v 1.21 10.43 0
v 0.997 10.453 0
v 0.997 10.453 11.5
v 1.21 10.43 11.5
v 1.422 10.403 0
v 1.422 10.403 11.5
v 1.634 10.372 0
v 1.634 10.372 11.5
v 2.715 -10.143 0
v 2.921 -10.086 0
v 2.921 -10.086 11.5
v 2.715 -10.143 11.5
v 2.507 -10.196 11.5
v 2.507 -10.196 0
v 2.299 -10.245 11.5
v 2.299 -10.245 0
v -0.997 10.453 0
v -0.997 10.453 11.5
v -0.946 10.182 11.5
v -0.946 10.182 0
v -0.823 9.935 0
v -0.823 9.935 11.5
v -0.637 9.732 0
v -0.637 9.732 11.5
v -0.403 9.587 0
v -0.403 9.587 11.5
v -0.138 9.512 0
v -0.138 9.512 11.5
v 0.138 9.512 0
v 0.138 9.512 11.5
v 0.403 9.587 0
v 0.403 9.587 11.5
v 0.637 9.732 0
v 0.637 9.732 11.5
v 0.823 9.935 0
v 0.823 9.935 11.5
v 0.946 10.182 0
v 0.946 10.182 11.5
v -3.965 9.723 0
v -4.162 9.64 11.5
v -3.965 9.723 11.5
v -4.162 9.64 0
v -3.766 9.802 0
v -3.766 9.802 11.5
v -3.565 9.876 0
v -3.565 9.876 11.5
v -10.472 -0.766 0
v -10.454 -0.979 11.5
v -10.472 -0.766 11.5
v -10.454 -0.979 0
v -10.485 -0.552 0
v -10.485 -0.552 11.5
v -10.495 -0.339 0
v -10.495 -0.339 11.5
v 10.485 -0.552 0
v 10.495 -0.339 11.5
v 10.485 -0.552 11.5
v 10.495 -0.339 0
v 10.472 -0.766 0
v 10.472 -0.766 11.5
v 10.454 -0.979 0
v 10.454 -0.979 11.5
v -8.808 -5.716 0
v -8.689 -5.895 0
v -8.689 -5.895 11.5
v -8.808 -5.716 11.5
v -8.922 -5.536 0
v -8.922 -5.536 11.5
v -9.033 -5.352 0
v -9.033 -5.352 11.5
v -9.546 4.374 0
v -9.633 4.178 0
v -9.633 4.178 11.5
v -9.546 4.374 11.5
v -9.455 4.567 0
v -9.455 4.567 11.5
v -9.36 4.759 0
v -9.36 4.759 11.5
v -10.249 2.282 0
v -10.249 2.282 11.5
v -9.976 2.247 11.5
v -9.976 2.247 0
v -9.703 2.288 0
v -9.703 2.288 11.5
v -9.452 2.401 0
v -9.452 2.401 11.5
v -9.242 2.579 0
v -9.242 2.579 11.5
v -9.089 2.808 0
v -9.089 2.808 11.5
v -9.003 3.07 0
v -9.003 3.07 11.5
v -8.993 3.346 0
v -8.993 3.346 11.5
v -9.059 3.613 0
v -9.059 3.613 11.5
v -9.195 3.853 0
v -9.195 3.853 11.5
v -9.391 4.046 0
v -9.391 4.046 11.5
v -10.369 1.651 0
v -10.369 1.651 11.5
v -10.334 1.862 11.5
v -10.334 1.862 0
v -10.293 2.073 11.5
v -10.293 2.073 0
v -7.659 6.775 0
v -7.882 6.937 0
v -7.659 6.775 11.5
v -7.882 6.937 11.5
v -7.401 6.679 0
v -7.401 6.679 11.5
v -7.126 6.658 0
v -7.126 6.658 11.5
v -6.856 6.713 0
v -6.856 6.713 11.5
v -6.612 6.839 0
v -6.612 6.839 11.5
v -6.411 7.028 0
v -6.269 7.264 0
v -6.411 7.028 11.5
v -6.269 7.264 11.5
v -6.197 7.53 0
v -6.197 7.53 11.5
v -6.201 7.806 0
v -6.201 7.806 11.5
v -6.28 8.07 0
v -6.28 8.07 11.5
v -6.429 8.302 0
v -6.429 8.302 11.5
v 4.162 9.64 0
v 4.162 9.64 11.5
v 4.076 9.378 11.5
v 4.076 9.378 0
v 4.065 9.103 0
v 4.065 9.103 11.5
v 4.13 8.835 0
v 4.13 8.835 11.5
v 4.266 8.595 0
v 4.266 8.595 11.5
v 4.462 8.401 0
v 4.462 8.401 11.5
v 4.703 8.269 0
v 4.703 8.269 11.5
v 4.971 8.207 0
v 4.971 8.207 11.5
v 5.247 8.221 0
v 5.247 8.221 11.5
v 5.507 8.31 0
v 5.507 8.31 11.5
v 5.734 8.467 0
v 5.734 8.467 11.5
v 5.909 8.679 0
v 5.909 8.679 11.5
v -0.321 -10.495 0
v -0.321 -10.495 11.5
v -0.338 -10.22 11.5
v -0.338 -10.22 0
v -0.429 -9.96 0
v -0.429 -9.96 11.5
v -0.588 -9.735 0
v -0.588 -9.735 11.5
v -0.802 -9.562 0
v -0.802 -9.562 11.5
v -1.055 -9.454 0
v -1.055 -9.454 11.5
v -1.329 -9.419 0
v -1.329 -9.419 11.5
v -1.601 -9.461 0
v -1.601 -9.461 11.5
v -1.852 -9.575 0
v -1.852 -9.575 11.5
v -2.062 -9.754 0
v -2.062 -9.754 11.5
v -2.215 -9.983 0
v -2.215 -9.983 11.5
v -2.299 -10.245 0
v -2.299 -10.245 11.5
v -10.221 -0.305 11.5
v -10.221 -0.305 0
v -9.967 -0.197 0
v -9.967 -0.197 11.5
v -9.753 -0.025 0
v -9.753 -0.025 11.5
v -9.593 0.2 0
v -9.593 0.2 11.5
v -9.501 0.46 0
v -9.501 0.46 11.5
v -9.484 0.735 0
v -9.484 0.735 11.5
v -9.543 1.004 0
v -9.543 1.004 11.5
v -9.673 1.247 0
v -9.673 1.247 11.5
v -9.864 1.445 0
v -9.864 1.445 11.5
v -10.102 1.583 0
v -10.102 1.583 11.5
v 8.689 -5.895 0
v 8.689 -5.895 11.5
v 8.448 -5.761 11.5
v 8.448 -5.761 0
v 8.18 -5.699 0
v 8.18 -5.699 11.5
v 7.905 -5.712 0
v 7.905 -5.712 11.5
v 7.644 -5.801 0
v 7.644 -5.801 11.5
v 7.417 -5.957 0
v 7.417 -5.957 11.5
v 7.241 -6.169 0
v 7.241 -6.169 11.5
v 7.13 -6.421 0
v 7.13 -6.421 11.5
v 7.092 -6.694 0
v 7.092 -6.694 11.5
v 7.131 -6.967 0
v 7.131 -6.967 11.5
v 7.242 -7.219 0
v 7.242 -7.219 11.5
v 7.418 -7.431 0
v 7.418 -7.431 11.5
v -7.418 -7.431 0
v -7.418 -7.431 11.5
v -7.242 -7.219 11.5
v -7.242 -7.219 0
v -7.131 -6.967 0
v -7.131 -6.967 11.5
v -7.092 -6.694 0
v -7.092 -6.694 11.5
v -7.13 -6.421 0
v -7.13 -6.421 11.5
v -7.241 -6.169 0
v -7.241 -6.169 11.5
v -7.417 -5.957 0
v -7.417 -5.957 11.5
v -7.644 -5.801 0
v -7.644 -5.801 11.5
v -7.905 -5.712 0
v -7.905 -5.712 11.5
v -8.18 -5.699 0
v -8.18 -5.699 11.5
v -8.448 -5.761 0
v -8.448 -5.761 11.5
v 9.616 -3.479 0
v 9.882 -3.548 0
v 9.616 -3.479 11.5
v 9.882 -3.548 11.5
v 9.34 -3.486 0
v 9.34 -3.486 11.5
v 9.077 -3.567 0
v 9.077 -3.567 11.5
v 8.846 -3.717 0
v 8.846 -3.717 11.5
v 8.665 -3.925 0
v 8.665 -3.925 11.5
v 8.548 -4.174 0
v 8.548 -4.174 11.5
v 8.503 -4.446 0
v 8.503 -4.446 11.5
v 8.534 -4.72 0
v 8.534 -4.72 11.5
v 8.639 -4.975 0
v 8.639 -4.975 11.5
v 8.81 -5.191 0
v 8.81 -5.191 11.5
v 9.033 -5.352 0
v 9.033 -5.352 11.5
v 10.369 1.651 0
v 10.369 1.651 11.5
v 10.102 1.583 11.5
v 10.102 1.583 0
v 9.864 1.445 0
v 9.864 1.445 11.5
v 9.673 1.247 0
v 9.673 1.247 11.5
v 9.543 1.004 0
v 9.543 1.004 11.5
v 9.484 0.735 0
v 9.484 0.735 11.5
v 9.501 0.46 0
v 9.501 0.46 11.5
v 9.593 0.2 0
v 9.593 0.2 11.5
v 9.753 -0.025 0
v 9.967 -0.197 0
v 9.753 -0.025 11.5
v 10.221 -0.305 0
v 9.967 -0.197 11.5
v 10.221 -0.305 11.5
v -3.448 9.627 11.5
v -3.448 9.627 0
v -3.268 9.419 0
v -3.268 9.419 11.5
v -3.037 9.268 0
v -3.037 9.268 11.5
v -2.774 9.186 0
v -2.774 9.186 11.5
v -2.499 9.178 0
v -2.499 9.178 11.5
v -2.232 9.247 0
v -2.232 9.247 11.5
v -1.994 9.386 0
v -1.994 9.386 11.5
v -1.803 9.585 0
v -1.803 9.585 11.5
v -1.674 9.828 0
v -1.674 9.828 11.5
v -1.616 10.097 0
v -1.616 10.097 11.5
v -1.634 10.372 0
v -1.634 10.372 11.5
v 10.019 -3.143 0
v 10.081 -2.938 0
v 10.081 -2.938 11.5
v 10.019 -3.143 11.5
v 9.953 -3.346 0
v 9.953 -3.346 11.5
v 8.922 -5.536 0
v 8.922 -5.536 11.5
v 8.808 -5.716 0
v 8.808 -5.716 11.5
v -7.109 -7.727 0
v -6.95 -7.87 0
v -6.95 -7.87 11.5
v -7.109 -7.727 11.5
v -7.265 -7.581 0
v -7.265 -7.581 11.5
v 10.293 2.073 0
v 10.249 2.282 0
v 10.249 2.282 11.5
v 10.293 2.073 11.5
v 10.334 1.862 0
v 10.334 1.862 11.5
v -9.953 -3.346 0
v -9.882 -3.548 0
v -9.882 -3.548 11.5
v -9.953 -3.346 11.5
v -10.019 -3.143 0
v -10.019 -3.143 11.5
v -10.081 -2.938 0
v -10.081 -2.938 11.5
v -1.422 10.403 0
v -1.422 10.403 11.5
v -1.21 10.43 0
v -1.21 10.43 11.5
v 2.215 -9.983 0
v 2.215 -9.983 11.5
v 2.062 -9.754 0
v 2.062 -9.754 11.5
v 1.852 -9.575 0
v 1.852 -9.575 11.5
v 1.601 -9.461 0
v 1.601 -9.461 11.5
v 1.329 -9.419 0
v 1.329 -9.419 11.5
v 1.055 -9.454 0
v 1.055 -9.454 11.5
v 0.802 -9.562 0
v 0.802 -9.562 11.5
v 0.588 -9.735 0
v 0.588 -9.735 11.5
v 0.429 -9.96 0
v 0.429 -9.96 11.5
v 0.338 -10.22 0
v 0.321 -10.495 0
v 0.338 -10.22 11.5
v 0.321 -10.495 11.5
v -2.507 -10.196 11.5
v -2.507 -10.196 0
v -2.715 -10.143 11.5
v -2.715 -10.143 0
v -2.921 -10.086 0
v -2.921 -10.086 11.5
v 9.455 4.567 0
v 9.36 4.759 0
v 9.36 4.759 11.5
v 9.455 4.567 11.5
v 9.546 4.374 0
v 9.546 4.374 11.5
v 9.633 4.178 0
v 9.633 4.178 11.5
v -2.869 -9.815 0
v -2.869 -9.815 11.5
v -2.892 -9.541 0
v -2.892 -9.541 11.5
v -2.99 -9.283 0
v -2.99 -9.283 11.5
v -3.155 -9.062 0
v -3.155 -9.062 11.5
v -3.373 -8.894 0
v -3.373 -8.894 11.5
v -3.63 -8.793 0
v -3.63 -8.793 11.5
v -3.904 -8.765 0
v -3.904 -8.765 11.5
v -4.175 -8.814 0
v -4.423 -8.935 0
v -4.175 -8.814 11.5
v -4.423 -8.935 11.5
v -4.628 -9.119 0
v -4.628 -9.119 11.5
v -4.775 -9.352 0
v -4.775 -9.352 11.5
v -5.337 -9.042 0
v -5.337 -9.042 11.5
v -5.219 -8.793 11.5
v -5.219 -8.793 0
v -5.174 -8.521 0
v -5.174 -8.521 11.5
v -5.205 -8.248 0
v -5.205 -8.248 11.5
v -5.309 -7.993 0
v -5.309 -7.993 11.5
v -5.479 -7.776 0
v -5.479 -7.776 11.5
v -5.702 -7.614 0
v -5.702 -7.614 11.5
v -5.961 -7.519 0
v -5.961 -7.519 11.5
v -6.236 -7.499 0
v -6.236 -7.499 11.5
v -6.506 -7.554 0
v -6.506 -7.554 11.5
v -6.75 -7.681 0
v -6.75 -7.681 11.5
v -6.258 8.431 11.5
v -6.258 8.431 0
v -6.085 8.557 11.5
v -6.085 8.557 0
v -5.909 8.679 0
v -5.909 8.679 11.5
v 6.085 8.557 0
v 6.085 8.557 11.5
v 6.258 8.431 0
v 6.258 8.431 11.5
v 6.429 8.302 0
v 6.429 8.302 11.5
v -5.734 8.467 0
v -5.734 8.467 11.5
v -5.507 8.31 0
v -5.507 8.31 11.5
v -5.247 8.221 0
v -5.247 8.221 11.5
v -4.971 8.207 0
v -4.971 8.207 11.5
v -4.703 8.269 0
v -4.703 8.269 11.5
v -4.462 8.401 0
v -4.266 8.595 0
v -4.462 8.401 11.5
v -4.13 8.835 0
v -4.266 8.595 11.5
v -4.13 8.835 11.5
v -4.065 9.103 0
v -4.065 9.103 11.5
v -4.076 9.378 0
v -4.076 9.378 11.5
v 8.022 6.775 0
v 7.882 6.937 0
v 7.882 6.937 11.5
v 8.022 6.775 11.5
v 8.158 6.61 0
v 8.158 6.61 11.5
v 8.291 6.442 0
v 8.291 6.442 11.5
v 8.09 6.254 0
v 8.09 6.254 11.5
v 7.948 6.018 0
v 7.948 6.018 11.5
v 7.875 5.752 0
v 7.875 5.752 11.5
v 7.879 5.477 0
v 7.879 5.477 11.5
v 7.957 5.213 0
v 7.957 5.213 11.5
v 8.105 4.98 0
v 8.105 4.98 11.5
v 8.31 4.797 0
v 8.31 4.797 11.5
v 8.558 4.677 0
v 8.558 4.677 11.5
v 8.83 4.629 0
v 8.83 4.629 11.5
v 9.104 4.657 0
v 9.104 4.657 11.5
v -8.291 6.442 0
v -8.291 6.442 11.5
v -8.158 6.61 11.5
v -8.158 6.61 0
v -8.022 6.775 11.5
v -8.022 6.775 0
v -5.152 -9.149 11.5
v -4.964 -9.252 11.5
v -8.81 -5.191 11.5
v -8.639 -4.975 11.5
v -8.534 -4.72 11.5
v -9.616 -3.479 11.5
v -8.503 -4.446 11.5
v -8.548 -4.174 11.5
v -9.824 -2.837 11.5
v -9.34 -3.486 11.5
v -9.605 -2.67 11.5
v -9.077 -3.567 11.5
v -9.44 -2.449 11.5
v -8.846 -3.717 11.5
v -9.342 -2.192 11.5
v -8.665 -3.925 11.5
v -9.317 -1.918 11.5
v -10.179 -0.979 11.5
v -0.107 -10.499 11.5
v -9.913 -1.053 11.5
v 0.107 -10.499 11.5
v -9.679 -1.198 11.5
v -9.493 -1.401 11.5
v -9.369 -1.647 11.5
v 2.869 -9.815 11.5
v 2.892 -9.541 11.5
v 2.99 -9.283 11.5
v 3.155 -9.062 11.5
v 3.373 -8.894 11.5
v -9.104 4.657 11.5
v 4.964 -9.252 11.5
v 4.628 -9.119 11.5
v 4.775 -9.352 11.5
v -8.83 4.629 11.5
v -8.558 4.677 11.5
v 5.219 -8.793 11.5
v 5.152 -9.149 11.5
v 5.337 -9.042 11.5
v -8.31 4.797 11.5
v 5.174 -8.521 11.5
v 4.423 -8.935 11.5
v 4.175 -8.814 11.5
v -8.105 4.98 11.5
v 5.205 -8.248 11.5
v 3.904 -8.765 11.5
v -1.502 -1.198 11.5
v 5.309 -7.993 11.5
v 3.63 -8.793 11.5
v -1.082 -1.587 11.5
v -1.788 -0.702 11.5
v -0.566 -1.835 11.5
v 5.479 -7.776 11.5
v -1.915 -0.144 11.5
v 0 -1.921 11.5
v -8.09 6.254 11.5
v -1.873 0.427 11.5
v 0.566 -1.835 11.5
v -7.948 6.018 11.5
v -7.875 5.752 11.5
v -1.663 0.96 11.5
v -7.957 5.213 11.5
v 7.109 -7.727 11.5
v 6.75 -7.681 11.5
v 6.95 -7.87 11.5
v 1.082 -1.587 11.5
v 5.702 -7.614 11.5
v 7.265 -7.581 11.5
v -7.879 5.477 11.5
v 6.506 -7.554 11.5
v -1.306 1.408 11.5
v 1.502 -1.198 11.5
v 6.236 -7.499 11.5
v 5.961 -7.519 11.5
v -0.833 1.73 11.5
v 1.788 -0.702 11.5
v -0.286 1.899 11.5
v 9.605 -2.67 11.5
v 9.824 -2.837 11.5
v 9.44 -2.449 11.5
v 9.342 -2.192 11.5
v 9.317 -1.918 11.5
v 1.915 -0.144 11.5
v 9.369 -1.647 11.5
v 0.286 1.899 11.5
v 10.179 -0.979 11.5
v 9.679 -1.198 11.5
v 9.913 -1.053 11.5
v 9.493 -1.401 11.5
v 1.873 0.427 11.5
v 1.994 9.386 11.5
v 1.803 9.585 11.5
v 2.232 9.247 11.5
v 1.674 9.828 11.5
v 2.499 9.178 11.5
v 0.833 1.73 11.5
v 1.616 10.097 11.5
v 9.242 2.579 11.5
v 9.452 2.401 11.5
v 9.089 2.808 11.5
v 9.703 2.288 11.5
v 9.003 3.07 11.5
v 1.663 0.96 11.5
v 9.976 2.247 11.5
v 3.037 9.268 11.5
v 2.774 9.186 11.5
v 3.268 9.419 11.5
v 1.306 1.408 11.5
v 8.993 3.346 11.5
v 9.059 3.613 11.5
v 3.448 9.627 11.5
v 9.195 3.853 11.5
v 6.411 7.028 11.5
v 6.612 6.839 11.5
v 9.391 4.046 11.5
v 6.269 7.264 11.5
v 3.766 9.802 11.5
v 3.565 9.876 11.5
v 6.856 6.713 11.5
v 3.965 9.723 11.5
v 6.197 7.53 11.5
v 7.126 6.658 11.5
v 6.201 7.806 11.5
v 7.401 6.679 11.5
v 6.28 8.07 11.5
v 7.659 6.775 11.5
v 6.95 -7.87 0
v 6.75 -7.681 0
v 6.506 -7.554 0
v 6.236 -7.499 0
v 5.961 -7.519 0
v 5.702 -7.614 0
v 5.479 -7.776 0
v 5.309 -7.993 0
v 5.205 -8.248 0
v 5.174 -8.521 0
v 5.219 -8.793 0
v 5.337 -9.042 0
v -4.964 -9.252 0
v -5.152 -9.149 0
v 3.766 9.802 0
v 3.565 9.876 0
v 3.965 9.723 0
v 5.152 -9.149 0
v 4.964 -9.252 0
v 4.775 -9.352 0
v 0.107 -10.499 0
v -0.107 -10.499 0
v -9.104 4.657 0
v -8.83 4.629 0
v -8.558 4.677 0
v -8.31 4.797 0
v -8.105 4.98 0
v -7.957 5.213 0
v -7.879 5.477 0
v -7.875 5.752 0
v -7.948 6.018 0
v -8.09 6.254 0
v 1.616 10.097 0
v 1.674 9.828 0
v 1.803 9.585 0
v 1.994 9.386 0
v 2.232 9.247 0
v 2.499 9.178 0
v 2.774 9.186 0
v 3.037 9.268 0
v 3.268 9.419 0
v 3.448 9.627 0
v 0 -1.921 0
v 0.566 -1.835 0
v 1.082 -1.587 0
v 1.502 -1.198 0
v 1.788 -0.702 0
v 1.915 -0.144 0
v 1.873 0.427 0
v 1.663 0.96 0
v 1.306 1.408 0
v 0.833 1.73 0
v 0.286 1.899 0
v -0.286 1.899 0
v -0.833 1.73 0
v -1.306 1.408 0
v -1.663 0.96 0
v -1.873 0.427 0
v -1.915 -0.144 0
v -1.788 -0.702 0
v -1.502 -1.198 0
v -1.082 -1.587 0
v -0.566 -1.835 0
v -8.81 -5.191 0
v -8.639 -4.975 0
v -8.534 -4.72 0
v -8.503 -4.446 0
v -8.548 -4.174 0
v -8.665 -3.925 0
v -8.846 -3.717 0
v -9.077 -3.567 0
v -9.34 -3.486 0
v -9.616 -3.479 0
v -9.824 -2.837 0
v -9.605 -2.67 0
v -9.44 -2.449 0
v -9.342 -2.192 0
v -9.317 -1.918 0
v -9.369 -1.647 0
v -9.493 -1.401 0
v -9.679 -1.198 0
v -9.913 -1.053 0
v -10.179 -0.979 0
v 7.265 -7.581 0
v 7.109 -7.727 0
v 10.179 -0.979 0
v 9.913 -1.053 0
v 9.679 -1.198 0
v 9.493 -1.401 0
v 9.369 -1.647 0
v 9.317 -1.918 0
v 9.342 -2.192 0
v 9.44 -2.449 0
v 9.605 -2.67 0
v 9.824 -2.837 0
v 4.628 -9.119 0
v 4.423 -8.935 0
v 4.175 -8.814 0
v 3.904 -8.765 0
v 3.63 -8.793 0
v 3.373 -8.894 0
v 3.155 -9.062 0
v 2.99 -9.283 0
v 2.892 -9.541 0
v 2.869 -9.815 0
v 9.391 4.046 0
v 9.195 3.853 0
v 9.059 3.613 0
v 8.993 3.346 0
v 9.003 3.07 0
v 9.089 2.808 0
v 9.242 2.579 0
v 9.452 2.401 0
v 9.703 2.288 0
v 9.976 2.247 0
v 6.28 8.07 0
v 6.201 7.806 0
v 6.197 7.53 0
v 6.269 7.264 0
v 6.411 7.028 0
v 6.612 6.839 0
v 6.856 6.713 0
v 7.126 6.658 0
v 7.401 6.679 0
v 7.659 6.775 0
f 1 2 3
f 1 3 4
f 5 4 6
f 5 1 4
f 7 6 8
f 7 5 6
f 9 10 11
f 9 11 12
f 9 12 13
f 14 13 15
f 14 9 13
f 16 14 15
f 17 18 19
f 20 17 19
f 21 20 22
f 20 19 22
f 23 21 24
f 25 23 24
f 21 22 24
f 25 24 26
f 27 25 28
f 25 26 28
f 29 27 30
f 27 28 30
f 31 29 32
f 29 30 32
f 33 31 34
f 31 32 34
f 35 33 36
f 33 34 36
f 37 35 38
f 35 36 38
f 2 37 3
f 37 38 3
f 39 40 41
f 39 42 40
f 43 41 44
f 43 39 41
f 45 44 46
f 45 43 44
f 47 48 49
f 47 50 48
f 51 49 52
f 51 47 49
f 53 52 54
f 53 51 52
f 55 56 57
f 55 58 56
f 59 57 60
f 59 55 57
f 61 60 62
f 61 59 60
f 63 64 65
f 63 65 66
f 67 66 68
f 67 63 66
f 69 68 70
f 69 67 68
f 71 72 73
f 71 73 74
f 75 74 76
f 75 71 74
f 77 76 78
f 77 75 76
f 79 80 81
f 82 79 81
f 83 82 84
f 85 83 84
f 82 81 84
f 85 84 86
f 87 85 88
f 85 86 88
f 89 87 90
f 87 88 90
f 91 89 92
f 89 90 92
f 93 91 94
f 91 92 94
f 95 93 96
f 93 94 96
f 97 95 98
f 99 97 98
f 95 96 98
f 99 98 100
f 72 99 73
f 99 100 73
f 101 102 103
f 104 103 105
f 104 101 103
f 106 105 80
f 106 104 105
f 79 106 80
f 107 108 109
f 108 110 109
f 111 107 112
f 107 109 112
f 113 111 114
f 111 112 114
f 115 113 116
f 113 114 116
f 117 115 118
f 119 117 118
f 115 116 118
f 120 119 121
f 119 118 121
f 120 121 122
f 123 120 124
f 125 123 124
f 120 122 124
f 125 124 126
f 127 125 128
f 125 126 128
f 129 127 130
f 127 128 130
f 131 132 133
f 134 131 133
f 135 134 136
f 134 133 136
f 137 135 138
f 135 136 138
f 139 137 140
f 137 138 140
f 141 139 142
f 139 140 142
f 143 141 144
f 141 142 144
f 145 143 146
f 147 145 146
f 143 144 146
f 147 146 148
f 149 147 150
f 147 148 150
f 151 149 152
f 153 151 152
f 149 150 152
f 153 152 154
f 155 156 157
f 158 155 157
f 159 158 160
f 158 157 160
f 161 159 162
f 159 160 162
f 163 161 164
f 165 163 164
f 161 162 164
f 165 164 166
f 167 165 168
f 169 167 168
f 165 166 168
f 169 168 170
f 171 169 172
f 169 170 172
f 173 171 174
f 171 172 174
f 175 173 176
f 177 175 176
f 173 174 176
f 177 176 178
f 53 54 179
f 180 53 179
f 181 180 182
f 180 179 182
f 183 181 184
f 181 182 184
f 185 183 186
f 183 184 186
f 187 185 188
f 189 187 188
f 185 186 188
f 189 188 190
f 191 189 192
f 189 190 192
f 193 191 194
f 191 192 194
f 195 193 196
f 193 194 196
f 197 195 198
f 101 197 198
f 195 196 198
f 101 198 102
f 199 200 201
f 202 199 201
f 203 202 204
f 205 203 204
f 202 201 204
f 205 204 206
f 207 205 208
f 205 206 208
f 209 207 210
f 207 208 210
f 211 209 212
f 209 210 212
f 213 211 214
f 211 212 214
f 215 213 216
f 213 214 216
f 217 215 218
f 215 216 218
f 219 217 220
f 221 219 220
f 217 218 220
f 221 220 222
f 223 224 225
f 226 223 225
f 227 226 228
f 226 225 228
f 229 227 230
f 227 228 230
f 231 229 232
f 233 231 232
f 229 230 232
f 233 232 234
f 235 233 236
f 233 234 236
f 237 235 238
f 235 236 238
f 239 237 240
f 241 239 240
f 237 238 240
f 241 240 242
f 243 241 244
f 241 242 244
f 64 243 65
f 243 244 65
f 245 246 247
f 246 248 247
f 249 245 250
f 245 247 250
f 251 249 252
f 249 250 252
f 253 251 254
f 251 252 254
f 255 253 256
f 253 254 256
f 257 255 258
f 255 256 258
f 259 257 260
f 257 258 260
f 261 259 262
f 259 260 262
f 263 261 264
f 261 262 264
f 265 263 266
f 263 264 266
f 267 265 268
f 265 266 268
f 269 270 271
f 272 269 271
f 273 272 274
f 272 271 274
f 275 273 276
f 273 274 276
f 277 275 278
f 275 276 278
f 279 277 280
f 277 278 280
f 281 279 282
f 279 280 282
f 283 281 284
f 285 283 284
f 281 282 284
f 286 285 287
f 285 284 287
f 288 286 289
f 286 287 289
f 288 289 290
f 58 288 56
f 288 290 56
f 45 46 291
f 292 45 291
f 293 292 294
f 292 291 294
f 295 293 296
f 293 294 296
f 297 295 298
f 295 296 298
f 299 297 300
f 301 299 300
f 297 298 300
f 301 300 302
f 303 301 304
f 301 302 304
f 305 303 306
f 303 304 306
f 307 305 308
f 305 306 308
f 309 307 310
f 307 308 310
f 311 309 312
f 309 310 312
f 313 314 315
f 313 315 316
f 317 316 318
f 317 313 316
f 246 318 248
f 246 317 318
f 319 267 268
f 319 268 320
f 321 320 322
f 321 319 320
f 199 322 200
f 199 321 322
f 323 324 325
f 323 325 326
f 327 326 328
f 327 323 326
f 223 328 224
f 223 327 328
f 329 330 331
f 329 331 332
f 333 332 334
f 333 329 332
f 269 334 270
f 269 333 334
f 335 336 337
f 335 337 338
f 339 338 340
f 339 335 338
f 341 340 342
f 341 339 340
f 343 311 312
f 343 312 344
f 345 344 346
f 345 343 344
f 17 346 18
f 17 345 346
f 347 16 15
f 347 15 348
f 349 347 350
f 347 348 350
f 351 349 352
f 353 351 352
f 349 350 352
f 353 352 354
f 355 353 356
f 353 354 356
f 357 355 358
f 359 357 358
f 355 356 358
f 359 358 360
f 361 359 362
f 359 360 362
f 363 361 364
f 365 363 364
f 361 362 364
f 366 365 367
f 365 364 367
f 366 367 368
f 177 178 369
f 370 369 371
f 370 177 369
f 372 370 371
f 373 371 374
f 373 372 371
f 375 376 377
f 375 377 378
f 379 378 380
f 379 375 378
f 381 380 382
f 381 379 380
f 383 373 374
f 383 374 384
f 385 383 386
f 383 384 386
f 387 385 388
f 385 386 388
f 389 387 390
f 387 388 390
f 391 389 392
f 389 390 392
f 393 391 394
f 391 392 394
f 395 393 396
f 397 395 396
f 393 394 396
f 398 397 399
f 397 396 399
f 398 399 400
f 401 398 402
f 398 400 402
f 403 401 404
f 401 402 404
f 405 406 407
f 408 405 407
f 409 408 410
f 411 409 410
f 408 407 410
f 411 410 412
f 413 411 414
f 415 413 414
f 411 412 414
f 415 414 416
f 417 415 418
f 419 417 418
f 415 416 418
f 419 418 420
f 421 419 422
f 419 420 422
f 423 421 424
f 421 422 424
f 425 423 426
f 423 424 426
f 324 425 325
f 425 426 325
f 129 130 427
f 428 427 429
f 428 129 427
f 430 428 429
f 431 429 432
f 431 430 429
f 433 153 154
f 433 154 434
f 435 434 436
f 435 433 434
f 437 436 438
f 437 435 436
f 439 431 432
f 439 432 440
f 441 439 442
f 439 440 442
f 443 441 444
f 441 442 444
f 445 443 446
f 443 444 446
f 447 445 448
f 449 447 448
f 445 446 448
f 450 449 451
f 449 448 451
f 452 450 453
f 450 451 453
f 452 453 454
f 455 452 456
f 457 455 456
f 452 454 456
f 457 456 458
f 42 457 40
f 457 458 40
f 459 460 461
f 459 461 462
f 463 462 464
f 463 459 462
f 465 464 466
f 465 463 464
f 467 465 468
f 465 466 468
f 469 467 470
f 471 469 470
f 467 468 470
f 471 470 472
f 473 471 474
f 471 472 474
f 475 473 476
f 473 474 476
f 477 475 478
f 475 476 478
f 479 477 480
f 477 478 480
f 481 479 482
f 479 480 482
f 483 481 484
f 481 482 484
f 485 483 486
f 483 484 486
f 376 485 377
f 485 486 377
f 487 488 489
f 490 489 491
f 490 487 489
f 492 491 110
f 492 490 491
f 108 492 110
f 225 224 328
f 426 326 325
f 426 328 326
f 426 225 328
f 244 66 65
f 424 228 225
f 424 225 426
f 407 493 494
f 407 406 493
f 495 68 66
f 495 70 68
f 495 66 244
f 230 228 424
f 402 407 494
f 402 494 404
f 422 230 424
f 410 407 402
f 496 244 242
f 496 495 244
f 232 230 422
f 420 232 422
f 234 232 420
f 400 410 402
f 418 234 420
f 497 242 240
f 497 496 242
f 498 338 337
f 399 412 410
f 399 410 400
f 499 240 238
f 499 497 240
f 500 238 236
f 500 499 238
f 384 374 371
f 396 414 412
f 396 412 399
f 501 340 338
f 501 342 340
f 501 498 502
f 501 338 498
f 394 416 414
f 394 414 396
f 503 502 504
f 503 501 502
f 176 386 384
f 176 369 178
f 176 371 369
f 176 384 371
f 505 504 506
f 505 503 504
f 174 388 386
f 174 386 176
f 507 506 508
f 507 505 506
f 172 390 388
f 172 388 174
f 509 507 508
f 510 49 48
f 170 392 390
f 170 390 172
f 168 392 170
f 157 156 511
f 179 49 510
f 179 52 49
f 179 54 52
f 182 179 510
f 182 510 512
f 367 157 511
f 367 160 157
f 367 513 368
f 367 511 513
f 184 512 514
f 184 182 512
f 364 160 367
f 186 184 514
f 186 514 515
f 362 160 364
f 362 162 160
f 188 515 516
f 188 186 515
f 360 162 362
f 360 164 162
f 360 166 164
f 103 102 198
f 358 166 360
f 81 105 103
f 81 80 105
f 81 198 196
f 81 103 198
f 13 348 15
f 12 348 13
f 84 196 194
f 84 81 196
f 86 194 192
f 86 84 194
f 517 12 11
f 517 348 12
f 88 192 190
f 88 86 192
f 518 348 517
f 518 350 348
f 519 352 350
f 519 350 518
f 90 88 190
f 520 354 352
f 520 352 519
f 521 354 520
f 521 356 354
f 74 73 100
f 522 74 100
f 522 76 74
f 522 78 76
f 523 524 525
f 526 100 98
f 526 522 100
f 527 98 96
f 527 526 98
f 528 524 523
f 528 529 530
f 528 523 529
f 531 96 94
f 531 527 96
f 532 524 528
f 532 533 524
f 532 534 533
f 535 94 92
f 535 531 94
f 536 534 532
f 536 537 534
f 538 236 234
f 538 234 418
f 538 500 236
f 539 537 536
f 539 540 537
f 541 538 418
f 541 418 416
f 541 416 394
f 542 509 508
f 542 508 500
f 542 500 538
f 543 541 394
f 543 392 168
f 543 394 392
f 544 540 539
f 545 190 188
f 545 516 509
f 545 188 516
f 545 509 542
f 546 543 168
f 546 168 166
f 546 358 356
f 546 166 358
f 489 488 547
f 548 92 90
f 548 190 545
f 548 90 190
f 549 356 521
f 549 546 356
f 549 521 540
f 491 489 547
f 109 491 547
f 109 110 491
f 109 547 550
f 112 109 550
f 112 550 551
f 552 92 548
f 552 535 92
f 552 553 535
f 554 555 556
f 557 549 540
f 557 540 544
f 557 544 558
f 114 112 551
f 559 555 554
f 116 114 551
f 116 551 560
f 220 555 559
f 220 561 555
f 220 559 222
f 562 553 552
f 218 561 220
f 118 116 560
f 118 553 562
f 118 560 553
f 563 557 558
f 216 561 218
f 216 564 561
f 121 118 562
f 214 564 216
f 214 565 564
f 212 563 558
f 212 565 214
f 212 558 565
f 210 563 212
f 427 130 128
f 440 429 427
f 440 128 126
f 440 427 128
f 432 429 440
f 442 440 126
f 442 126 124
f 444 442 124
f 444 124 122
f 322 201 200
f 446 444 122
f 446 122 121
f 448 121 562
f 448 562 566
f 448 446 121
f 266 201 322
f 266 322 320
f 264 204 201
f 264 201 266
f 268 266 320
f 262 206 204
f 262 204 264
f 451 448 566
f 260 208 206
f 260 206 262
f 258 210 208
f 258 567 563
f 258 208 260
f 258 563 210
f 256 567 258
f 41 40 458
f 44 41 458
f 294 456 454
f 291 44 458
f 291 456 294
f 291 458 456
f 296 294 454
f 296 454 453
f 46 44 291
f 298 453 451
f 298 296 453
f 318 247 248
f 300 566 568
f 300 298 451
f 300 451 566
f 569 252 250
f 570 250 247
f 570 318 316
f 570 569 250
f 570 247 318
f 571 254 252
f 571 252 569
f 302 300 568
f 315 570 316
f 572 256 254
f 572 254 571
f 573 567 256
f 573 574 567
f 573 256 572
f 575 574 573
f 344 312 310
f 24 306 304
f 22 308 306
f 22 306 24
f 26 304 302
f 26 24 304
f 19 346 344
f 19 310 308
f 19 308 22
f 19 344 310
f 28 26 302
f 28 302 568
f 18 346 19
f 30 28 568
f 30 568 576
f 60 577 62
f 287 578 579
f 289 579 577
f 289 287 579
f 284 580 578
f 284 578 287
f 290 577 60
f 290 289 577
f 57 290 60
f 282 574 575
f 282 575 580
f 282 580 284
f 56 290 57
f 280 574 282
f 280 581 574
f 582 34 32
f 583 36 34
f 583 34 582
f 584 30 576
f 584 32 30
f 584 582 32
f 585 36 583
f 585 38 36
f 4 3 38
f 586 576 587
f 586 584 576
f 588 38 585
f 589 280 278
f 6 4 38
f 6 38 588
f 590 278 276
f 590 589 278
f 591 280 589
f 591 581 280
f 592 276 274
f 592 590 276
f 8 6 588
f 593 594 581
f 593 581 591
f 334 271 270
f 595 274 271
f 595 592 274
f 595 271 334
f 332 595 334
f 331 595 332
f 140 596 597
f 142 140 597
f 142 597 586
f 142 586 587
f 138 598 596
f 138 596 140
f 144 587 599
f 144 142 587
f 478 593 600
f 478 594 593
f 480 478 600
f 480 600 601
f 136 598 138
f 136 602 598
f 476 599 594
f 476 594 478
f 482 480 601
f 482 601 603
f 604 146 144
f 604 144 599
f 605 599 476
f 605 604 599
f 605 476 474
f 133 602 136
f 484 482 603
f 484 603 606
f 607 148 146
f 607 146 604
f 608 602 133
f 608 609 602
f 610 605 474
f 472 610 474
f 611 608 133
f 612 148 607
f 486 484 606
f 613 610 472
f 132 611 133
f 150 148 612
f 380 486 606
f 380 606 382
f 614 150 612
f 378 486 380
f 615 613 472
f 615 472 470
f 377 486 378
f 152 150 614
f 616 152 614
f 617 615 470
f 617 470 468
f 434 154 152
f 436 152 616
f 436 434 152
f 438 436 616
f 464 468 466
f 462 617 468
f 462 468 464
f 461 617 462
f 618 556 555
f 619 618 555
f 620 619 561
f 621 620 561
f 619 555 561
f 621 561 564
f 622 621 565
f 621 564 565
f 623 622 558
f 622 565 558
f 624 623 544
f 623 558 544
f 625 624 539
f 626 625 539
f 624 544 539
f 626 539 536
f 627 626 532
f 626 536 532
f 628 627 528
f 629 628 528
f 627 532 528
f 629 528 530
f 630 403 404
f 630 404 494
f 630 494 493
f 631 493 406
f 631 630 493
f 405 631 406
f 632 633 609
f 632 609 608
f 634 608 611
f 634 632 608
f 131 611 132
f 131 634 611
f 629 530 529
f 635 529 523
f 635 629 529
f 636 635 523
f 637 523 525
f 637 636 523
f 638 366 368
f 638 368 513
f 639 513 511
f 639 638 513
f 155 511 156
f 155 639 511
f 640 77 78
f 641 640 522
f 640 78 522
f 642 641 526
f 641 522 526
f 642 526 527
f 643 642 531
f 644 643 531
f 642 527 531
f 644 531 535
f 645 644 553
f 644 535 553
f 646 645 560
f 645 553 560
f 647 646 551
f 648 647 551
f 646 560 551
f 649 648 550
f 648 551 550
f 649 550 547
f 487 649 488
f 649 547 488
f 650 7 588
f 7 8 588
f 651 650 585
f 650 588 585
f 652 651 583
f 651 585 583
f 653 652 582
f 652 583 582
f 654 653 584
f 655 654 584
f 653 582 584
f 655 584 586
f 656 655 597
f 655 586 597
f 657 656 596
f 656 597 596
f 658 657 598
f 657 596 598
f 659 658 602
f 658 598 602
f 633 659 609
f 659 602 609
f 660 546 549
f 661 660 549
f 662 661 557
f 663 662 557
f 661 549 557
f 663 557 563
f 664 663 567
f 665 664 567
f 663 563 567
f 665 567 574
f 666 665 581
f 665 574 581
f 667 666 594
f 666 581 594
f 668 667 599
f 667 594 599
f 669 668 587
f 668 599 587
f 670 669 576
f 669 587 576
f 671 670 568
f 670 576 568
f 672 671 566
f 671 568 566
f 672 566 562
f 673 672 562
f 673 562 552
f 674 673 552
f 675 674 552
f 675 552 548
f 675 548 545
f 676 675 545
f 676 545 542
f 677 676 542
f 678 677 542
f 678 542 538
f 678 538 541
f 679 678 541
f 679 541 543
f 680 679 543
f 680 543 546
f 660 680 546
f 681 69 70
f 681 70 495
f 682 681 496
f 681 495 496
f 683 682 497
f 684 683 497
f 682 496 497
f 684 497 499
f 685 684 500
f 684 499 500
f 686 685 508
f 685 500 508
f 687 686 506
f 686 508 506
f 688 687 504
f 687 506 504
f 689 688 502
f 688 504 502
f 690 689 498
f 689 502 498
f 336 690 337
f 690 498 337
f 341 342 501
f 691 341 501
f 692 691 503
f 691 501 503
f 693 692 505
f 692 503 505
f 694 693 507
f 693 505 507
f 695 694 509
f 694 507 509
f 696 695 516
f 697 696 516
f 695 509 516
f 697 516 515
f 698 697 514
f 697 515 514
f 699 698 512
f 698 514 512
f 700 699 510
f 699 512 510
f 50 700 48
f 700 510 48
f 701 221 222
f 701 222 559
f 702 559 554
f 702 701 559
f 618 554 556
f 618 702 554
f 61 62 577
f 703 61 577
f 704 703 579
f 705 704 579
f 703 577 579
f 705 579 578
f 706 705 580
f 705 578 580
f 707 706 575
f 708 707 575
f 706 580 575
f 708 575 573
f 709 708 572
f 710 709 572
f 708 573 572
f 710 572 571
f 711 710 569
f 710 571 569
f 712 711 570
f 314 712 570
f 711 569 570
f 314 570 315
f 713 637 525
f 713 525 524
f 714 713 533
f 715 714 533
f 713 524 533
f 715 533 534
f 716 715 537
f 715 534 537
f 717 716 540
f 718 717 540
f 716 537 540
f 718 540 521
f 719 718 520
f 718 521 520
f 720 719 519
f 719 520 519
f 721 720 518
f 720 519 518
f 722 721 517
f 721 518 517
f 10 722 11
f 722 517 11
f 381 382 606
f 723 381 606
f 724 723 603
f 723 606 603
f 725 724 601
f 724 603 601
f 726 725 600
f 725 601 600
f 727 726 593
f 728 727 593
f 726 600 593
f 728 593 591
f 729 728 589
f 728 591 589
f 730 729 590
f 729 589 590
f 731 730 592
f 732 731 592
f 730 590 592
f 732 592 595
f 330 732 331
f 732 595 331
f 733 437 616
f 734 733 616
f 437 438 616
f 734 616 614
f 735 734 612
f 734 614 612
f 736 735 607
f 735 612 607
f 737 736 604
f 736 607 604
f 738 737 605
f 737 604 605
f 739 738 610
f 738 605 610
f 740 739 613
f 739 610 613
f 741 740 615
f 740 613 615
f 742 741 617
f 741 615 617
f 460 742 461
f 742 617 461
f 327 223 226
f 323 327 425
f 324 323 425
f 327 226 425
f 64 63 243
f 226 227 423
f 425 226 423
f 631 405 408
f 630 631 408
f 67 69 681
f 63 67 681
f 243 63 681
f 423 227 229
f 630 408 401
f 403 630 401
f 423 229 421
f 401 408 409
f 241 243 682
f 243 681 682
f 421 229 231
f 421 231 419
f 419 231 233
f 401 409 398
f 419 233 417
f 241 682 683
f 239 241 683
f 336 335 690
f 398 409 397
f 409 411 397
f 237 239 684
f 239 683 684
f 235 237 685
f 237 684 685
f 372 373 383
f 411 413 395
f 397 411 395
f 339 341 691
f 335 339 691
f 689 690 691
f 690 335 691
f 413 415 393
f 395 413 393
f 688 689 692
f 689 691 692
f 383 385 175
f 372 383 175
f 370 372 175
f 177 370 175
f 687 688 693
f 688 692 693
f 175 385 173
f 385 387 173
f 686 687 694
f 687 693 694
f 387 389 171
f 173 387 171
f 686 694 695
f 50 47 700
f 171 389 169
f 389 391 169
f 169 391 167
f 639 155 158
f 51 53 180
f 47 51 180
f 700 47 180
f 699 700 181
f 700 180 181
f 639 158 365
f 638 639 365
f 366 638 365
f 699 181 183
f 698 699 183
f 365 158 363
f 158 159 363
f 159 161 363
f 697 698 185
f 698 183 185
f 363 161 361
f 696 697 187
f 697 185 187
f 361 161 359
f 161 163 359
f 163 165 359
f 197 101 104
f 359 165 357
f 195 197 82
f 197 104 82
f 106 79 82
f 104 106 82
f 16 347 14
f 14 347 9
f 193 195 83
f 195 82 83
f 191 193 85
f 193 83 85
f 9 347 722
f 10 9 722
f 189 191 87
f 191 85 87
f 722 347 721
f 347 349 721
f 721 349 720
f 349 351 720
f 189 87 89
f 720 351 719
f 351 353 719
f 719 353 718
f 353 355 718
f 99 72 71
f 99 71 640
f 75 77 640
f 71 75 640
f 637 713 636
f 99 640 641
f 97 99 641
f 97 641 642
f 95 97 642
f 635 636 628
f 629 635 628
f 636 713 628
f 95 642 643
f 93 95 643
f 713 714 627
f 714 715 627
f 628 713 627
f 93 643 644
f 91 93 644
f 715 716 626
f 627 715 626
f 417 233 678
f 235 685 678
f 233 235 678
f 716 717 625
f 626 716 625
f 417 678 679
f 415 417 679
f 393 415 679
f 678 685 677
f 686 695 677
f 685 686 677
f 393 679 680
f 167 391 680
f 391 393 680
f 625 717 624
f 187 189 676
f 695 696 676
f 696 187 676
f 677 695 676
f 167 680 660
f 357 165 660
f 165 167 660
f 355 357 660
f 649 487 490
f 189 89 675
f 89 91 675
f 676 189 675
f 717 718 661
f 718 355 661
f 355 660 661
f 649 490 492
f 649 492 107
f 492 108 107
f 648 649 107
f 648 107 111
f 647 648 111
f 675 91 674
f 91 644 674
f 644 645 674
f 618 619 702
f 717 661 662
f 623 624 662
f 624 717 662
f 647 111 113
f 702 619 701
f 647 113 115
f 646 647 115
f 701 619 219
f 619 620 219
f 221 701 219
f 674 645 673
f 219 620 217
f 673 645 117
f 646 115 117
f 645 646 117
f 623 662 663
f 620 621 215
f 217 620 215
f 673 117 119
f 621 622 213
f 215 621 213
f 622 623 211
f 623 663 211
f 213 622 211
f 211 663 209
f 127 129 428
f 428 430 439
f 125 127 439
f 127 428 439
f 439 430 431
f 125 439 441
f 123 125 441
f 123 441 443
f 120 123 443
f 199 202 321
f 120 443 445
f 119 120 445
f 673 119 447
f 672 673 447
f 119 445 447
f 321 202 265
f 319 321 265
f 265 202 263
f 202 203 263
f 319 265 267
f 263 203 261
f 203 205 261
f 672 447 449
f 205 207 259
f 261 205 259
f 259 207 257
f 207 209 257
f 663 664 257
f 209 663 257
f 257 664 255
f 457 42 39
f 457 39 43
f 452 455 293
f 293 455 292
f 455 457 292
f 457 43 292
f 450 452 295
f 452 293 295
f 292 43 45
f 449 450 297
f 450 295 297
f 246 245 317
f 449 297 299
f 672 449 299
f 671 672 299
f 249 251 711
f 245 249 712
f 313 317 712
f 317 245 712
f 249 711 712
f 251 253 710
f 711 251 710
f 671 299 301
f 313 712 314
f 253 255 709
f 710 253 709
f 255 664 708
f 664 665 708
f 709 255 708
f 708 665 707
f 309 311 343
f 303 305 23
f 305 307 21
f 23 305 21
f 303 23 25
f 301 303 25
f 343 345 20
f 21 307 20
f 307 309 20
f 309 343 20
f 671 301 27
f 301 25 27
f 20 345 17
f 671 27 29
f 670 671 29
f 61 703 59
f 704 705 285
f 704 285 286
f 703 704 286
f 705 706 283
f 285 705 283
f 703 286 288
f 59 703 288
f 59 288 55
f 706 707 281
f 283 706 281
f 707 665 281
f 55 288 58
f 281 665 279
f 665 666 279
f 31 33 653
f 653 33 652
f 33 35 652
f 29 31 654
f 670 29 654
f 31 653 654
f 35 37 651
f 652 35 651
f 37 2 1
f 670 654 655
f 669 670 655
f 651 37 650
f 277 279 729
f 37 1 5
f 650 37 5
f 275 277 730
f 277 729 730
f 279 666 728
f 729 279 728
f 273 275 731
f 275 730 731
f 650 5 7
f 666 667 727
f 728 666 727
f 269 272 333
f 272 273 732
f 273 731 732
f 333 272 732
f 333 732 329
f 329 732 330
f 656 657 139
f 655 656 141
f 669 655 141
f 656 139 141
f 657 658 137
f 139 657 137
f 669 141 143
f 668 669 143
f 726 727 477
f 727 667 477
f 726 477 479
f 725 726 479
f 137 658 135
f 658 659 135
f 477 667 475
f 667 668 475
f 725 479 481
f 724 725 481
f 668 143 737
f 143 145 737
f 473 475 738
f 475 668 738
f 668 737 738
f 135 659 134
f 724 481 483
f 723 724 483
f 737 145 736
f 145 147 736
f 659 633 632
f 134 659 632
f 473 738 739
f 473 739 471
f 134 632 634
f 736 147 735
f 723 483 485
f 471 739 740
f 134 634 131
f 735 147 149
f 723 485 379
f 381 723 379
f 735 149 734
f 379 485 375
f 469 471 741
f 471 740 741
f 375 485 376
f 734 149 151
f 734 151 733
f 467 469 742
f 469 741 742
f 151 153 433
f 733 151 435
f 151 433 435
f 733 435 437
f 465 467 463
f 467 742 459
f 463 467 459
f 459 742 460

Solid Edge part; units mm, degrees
sketch "Sketch1" plane through (0, 0, 0) normal (0, 0, 1) x (1, 0, 0)
  circle A0 centre (0, 0) radius 10.5
  dimension "D1" = 21
extrude "Ajout_matière_1" add sketch "Sketch1" along normal blind 11.5
sketch "Sketch2" plane through (0, 0, 11.5) normal (0, 0, 1) x (1, 0, 0)
  circle A0 centre (0, 10.5) radius 0.998
extrude "Cutout1" cut sketch "Sketch2" against normal through all
pattern_circular "Pattern1" count 25 over 360 about axis through (0, 0, 11.5) along (0, 0, -1) of "Cutout1"
sketch "Sketch3" plane through (0, -0.0199, 11.5) normal (0, 0, 1) x (0, -1, 0)
  circle A0 centre (-0.0199, 0) radius 1.9207
extrude "Cutout2" cut sketch "Sketch3" along normal through all and the other way through all
properties material "Nylon, usage général"
